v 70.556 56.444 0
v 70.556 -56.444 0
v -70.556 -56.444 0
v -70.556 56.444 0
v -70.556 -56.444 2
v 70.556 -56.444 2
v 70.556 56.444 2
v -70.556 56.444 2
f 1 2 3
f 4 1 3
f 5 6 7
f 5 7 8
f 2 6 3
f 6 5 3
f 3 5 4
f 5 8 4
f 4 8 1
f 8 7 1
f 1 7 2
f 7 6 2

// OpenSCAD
// Module names are of the form poly_<inkscape-path-id>().
// As a result you can associate a polygon in this OpenSCAD program with the
//  corresponding SVG element in the Inkscape document by looking for 
//  the XML element with the attribute id="inkscape-path-id".

// Paths have their own variables so they can be imported and used 
//  in polygon(points) structures in other programs.
// The NN_points is the list of all polygon XY vertices. 
// There may be an NN_paths variable as well. If it exists then it 
//  defines the nested paths. Both must be used in the 
//  polygon(points, paths) variant of the command.

profile_scale = 25.4/90; //made in inkscape in mm

// helper functions to determine the X,Y dimensions of the profiles
function min_x(shape_points) = min([ for (x = shape_points) min(x[0])]);
function max_x(shape_points) = max([ for (x = shape_points) max(x[0])]);
function min_y(shape_points) = min([ for (x = shape_points) min(x[1])]);
function max_y(shape_points) = max([ for (x = shape_points) max(x[1])]);

height = 2;
width = 1.0;


rect2162_0_points = [[-250.000000,-200.000000],[250.000000,-200.000000],[250.000000,200.000000],[-250.000000,200.000000],[-250.000000,-200.000000]];

module poly_rect2162(h, w, res=4)  {
  scale([profile_scale, -profile_scale, 1])
  union()  {
    linear_extrude(height=h)
      polygon(rect2162_0_points);
  }
}

// The shapes
poly_rect2162(height, width);
